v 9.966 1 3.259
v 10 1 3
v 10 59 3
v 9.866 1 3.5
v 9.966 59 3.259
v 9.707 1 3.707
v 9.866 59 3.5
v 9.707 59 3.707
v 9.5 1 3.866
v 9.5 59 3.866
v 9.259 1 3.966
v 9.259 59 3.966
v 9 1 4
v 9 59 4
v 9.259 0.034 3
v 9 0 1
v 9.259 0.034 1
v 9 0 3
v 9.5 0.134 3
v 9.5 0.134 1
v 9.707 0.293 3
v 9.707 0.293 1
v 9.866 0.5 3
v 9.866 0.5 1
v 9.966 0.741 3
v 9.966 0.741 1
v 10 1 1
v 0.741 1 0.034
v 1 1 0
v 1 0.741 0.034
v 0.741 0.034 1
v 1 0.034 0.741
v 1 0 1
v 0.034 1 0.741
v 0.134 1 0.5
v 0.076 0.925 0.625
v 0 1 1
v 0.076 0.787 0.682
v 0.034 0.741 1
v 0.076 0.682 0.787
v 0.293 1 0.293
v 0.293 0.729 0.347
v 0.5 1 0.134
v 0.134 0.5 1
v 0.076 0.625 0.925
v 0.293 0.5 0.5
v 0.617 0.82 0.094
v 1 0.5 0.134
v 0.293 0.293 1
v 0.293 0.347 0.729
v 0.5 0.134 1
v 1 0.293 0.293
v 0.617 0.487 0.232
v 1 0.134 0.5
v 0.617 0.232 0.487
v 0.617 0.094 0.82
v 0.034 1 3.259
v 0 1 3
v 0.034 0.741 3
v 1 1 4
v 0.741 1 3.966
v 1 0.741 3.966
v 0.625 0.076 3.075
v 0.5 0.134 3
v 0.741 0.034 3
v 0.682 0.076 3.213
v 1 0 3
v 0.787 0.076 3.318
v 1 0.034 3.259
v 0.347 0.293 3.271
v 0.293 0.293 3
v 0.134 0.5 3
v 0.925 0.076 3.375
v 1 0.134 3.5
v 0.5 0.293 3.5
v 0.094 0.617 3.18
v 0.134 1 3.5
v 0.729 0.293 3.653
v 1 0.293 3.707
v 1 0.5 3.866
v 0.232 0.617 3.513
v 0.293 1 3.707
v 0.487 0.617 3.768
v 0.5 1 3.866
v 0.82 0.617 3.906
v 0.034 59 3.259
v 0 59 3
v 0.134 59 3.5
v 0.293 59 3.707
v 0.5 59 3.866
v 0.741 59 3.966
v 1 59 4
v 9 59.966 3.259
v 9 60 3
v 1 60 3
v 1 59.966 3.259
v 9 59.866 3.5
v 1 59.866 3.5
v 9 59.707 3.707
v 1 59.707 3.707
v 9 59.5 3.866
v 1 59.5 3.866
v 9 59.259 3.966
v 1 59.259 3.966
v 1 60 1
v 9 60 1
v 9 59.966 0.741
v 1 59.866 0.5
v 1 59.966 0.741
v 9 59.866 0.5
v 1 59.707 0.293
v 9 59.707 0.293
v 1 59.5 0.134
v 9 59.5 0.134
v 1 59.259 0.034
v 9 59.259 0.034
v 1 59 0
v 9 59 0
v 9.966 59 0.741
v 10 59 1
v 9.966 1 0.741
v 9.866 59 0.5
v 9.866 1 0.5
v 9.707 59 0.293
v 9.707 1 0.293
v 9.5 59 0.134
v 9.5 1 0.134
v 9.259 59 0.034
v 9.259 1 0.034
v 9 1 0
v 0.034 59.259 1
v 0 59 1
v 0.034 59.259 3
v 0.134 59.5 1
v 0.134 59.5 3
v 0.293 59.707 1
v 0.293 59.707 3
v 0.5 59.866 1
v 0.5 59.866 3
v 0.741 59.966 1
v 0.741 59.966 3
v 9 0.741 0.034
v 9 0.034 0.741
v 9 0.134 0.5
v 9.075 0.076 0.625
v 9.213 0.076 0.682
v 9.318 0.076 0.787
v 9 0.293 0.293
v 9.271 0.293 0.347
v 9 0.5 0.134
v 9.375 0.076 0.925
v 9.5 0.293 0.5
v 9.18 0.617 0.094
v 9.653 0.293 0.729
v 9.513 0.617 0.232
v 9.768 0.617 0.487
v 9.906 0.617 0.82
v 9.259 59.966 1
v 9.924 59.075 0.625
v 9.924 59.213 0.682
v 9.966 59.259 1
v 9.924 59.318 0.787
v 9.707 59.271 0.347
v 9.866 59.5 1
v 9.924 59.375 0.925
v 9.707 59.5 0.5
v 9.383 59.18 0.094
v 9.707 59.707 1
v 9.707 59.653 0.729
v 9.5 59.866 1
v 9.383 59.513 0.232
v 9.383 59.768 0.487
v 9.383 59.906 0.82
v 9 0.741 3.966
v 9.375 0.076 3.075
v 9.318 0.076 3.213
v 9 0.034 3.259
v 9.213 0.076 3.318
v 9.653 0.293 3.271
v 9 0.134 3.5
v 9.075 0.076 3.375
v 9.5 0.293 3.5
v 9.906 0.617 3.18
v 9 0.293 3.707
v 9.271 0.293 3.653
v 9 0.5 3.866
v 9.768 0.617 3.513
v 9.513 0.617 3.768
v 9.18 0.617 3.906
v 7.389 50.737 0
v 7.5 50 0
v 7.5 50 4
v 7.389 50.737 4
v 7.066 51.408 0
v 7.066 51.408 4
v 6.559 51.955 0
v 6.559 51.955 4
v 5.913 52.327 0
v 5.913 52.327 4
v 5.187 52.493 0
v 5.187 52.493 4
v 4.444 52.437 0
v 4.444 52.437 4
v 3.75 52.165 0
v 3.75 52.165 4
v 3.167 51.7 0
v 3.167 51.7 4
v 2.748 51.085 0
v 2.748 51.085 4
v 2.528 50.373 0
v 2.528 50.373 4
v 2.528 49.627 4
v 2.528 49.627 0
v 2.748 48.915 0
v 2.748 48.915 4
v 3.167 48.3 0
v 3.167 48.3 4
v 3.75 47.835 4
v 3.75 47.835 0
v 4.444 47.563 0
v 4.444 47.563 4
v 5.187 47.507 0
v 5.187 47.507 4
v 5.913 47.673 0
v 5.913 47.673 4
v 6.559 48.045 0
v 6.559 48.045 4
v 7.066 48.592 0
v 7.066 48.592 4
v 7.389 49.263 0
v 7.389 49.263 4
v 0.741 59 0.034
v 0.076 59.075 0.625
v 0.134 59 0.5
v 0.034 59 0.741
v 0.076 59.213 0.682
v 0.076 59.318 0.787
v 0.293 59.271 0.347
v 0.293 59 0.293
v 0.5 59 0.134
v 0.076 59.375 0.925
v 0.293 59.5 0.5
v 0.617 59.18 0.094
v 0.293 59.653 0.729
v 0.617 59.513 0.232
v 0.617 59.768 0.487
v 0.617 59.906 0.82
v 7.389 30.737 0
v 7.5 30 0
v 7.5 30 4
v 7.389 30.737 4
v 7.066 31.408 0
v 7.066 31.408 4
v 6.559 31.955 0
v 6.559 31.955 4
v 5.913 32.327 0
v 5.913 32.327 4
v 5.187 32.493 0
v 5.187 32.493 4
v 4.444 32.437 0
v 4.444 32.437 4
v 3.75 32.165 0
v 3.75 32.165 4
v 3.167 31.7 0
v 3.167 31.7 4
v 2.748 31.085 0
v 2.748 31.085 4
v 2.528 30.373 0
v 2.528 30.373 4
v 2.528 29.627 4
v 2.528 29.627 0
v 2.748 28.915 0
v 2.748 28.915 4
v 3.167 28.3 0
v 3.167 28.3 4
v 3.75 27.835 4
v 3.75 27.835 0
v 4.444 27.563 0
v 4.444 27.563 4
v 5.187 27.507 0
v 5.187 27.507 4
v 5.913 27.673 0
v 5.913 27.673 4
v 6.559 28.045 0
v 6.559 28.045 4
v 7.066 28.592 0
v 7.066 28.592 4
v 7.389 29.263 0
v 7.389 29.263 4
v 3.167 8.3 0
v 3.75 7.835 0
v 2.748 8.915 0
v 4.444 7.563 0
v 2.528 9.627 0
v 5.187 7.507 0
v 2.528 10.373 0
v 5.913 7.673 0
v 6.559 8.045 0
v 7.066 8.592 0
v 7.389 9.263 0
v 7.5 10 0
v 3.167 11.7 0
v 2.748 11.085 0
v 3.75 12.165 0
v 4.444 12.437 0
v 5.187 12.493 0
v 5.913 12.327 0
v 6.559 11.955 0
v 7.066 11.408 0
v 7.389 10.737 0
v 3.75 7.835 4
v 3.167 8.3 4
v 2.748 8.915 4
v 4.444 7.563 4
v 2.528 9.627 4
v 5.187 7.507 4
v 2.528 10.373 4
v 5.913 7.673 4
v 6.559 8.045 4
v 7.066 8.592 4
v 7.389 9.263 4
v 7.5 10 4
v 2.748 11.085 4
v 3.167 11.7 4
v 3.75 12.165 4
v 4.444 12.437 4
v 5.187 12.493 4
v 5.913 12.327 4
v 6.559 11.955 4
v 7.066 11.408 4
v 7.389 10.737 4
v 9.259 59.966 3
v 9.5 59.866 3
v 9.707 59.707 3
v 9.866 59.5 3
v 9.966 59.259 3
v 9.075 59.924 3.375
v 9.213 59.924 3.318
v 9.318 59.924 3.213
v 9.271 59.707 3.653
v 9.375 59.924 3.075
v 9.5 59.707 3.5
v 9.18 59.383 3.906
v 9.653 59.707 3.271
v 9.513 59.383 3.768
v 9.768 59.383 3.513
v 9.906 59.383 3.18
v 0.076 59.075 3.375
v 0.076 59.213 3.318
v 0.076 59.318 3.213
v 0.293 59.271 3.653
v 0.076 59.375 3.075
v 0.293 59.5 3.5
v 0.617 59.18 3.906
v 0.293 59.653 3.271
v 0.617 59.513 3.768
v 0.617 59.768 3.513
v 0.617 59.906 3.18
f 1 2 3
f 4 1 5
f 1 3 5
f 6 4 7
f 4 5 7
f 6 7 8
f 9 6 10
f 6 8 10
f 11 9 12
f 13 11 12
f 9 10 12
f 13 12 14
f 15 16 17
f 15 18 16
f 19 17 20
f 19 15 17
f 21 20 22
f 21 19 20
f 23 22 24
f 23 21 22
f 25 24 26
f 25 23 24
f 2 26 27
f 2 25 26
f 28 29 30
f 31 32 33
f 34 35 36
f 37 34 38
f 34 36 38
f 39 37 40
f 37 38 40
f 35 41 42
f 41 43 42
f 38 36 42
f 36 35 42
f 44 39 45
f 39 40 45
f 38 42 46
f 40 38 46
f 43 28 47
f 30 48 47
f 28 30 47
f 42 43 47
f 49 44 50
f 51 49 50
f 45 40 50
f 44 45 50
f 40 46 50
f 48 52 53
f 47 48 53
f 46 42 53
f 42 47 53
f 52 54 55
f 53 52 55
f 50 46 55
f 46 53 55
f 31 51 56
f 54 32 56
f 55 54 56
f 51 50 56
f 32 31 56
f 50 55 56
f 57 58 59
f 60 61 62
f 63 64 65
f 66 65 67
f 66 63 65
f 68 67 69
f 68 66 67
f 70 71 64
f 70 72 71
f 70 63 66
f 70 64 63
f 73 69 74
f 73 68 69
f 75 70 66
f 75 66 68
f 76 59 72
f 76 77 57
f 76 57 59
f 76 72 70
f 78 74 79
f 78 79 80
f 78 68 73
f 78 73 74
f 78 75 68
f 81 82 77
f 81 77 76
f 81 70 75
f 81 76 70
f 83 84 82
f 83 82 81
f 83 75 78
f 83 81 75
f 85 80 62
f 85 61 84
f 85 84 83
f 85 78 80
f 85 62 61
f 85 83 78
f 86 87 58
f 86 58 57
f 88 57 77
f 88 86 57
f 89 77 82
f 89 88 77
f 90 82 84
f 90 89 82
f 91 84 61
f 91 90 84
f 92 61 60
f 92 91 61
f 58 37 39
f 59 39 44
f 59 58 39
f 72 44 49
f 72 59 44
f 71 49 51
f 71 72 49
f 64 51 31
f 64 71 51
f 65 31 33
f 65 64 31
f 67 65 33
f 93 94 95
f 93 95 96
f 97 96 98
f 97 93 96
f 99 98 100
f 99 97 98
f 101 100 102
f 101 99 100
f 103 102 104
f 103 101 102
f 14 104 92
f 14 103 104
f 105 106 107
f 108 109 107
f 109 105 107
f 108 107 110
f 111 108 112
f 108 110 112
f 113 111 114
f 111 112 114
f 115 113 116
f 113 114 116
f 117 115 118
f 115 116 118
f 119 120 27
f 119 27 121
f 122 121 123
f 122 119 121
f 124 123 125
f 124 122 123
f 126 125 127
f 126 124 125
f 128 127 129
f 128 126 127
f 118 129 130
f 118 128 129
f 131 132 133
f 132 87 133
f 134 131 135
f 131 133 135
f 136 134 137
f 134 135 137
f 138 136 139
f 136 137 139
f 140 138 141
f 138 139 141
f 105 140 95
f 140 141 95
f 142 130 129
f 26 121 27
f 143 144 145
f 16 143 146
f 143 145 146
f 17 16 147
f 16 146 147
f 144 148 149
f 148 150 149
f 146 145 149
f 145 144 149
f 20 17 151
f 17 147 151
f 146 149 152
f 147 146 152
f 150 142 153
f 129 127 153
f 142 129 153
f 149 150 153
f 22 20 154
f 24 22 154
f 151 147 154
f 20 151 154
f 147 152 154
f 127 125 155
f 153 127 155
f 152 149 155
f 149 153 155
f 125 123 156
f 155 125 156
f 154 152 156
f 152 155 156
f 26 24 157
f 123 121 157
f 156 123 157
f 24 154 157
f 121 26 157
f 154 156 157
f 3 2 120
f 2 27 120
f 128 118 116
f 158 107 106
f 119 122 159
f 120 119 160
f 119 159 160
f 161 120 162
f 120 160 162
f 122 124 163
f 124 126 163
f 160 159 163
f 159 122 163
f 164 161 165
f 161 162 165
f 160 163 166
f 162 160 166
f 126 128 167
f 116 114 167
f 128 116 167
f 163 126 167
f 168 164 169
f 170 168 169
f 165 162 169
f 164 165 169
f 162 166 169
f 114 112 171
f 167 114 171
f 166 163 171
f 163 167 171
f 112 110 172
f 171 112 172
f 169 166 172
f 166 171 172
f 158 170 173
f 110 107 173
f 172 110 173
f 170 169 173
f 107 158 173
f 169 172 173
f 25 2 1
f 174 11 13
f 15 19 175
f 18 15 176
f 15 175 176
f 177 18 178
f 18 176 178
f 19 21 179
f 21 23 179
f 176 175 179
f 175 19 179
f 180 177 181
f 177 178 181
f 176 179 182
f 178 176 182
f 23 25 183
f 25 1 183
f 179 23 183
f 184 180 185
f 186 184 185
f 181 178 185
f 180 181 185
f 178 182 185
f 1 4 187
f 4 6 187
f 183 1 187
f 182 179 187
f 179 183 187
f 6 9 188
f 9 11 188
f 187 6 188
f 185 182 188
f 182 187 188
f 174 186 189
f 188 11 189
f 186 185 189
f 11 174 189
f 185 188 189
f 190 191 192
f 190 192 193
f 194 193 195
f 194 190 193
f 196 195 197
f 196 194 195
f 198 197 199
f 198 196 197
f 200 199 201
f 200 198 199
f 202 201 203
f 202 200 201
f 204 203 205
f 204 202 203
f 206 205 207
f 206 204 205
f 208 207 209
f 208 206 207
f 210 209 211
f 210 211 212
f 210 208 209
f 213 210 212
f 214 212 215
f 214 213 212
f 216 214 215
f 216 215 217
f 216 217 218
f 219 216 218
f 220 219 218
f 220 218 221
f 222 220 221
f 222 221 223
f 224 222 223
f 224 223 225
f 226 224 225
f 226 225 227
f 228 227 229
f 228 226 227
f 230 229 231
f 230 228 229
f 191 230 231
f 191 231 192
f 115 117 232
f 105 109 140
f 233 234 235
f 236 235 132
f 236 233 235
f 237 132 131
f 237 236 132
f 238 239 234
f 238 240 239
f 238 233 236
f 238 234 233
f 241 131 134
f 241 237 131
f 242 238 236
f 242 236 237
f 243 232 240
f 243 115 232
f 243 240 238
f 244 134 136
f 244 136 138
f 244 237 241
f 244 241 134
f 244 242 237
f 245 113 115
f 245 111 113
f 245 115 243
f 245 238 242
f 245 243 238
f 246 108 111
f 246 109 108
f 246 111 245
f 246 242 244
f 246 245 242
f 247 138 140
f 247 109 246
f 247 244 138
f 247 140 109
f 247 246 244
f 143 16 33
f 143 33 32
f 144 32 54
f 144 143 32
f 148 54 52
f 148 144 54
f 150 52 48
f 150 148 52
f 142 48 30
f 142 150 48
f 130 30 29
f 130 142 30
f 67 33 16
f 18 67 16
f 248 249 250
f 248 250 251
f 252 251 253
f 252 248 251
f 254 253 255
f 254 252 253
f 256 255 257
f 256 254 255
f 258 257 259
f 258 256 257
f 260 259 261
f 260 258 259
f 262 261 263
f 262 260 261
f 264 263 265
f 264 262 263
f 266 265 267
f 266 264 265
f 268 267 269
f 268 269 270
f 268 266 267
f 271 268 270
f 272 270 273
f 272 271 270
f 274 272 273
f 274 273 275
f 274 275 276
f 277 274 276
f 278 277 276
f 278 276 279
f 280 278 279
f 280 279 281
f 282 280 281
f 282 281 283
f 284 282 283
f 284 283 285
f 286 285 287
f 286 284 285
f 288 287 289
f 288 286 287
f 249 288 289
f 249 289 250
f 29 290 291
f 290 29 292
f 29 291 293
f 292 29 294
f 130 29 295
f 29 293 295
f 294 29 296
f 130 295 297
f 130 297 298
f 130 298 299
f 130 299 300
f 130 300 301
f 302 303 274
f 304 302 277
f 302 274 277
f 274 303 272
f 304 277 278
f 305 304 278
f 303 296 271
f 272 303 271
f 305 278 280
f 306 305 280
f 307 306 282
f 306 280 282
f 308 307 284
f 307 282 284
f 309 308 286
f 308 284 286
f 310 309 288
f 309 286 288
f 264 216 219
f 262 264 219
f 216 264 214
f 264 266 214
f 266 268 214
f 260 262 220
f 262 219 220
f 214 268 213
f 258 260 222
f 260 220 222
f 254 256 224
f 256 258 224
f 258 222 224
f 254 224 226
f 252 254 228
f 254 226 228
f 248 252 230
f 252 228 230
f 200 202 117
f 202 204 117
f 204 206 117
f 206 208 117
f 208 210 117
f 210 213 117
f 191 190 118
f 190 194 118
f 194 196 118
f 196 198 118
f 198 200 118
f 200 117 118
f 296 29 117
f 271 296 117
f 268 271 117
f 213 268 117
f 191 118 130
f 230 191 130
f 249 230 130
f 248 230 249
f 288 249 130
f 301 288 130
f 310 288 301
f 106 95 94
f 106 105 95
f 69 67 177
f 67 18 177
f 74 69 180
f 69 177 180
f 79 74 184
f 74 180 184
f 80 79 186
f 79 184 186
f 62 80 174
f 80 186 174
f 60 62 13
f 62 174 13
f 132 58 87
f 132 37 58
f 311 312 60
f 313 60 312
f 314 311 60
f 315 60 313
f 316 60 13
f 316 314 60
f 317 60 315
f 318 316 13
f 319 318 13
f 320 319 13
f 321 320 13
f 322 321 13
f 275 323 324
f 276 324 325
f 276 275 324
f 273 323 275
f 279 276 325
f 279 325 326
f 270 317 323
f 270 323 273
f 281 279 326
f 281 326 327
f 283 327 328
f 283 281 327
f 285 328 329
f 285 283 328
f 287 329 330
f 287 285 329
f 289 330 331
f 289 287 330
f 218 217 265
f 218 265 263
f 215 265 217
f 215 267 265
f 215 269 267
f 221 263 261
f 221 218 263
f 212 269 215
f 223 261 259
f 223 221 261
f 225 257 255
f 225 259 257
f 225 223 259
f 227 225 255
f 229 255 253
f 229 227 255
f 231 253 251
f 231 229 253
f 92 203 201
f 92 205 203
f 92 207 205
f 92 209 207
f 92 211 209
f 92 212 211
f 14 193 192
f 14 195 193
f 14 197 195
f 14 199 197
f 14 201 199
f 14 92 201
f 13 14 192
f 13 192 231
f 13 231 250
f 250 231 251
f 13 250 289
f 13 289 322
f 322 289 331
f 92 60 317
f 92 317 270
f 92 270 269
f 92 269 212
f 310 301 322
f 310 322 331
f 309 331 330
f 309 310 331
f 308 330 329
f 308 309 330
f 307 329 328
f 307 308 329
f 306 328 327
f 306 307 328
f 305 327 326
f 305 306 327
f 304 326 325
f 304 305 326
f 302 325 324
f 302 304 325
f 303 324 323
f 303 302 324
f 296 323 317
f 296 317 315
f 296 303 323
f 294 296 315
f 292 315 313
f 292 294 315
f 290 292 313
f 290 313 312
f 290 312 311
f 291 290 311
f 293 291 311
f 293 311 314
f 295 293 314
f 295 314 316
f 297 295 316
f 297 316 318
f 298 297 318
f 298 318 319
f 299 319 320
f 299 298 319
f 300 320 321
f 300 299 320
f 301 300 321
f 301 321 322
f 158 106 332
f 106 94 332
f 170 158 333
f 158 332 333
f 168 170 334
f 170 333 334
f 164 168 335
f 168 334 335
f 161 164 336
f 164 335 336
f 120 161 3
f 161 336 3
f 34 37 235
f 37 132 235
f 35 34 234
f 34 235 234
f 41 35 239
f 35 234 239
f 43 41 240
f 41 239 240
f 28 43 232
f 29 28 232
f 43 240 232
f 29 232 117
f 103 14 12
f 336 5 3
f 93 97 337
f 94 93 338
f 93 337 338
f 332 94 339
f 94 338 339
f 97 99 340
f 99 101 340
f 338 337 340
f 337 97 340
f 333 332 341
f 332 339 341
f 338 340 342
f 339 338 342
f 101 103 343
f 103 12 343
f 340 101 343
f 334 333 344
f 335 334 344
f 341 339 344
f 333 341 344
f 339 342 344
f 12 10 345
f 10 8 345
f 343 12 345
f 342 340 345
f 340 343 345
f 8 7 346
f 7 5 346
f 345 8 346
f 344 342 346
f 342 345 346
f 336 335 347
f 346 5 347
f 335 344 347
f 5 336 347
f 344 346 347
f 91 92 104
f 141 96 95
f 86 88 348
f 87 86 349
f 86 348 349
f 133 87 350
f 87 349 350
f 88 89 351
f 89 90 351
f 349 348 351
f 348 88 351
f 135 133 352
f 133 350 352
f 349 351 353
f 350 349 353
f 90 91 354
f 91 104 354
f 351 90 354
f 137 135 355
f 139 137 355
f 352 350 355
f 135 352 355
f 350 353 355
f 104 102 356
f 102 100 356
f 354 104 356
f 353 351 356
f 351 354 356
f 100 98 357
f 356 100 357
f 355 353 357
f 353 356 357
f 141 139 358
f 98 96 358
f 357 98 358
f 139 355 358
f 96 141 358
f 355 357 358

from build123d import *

# Parameters (mm, degrees)
SKETCH2_W           = 10
SKETCH2_H           = 60
SKETCH2_R           = 2.5
BOSS_EXTRUDE1_DEPTH = 4
FILLET1_R           = 1


with BuildPart() as part:
    # Sketch2 → Boss-Extrude1 (new body)
    with BuildSketch(Plane.XY):
        with Locations((5, 30)):
            Rectangle(SKETCH2_W, SKETCH2_H)
        with Locations((5, 50)):
            Circle(SKETCH2_R, mode=Mode.SUBTRACT)
        with Locations((5, 10)):
            Circle(SKETCH2_R, mode=Mode.SUBTRACT)
        with Locations((5, 30)):
            Circle(SKETCH2_R, mode=Mode.SUBTRACT)
    extrude(amount=BOSS_EXTRUDE1_DEPTH)

    # Fillet1
    fillet1_edges = [part.edges().sort_by_distance(p)[0] for p in [
        (10, 30, 4),
        (5, 60, 4),
        (0, 30, 4),
        (5, 60, 0),
        (10, 30, 0),
        (5, 0, 0),
        (0, 30, 0),
        (0, 60, 2),
        (10, 60, 2),
        (10, 0, 2),
        (0, 0, 2),
        (5, 0, 4),
    ]]
    fillet(fillet1_edges, radius=FILLET1_R)


solid = part.part
